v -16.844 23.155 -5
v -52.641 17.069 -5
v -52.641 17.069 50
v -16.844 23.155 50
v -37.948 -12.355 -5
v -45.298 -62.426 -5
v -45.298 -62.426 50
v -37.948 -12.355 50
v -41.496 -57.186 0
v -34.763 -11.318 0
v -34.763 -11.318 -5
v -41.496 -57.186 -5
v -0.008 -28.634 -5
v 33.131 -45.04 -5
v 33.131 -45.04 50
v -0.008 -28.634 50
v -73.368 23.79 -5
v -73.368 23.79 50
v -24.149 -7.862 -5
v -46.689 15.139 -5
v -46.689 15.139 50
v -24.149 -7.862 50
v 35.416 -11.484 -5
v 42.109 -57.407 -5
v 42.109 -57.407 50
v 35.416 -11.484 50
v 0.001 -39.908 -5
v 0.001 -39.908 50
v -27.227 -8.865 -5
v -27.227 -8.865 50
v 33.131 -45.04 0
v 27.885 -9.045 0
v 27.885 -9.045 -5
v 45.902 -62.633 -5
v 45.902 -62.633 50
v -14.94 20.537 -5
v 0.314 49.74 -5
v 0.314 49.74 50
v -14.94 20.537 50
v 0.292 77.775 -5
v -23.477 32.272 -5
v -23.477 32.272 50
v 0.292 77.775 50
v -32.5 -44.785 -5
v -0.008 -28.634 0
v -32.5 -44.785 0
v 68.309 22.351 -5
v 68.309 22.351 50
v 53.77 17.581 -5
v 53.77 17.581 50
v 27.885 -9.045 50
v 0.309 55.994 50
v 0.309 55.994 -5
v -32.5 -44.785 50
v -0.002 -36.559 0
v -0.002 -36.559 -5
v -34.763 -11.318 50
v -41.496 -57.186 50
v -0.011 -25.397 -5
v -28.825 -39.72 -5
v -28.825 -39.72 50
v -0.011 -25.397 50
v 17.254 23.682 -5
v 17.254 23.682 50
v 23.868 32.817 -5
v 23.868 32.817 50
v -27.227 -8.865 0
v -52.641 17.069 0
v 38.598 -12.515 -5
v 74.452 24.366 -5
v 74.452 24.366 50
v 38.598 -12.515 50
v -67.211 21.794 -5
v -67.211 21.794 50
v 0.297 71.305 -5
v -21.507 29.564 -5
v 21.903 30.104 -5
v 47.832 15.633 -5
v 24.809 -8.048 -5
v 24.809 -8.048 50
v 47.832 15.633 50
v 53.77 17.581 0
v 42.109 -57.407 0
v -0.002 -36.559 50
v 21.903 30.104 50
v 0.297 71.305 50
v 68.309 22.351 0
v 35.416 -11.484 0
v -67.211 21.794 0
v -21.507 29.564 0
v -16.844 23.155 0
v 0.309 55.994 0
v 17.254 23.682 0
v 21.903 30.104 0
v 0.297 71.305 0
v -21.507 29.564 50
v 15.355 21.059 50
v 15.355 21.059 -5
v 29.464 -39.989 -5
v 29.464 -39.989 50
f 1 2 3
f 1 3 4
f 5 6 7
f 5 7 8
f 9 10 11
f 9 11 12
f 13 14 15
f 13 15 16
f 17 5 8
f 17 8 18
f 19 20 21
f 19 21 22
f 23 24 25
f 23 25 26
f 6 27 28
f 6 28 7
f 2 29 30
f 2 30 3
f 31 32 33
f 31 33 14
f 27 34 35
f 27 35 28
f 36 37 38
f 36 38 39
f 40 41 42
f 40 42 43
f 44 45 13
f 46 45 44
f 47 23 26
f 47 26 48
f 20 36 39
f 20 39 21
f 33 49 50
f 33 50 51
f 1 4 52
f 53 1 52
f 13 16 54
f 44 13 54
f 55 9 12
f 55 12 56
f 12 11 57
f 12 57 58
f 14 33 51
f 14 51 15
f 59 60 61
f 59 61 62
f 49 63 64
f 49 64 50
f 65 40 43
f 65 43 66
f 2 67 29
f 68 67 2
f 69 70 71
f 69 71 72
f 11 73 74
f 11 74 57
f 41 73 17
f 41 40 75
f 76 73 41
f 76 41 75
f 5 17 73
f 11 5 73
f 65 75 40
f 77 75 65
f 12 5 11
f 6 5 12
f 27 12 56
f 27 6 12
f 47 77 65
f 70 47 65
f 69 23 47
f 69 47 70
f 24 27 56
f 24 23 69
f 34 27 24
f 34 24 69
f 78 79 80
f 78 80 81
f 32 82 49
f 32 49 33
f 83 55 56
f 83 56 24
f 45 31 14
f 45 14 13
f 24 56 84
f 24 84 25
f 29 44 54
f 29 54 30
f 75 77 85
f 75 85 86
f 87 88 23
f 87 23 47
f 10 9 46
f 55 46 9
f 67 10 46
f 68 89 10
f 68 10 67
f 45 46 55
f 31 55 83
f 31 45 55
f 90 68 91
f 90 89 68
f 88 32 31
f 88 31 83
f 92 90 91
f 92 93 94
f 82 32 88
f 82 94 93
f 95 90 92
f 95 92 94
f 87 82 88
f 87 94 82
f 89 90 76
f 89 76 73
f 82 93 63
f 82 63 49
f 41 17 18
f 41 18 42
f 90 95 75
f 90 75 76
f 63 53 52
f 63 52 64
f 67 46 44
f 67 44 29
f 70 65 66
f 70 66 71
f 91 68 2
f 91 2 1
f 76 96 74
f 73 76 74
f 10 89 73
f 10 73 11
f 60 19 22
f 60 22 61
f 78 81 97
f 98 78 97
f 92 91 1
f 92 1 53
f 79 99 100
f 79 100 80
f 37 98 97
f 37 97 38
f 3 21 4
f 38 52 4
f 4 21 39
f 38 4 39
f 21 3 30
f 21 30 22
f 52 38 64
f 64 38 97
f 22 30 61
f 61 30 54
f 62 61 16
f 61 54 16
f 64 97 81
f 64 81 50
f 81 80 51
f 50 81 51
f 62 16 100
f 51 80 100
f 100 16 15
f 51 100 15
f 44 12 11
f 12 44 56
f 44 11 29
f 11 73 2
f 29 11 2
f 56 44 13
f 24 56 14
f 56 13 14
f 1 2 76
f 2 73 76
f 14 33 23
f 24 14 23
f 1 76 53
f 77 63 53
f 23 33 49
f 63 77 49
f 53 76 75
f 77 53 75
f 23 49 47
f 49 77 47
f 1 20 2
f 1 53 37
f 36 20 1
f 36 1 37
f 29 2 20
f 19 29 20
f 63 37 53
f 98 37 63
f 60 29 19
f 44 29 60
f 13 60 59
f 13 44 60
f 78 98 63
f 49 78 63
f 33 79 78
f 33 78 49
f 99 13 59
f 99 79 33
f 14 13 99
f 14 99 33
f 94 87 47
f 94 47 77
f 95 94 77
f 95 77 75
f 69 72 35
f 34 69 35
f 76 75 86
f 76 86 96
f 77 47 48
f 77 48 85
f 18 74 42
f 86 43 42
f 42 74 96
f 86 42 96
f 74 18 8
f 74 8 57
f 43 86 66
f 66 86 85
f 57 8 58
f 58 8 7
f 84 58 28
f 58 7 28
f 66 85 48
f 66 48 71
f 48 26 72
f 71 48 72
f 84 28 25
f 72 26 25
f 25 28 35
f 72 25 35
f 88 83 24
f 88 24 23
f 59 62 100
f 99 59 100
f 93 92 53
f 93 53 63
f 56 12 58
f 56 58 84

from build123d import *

# Parameters (mm, degrees)
F1_DEPTH = 5
F3_DEPTH = 55


with BuildPart() as f1:
    # F0 (on Top) → F1 (new body)
    with BuildSketch(Plane.XY):
        Polygon((-34.763327, -11.318235), (-41.496448, -57.185943), (-0.0018, -36.559422), (42.108634, -57.407447), (35.415632, -11.484328), (68.309159, 22.35061), (21.903292, 30.103534), (0.296809, 71.305215), (-21.50674, 29.564362), (-67.211132, 21.793876), align=None)
        Polygon((-16.844336, 23.155162), (0.309144, 55.993896), (17.253802, 23.681909), (53.77023, 17.581192), (27.885076, -9.044794), (33.131209, -45.040425), (-0.008188, -28.633779), (-32.499982, -44.785083), (-27.227054, -8.864577), (-52.640564, 17.069225), align=None, mode=Mode.SUBTRACT)
    extrude(amount=-F1_DEPTH)


with BuildPart() as f3:
    # F2 (on face) → F3 (new body)
    with BuildSketch(Plane(origin=(0, 0, -5), x_dir=(1, 0, 0), z_dir=(0, 0, -1))):
        Polygon((23.867865, -32.816896), (74.452369, -24.365858), (38.597557, 12.515117), (45.901911, 62.632949), (0.0009, 39.908285), (-45.297772, 62.425743), (-37.947667, 12.354991), (-73.367711, -23.790208), (-23.476769, -32.272474), (0.291597, -77.774787), align=None)
        Polygon((-21.50674, -29.564362), (-67.211132, -21.793876), (-34.763327, 11.318235), (-41.496448, 57.185943), (-0.0018, 36.559422), (42.108634, 57.407447), (35.415632, 11.484328), (68.309159, -22.35061), (21.903292, -30.103534), (0.296809, -71.305215), align=None, mode=Mode.SUBTRACT)
        Polygon((-16.844336, -23.155162), (0.309144, -55.993896), (17.253802, -23.681909), (53.77023, -17.581192), (27.885076, 9.044794), (33.131209, 45.040425), (-0.008188, 28.633779), (-32.499982, 44.785083), (-27.227054, 8.864577), (-52.640564, -17.069225), align=None)
        Polygon((24.809214, 8.048364), (47.831793, -15.63312), (15.354714, -21.058992), (0.314183, -49.739976), (-14.939974, -20.53732), (-46.689205, -15.139438), (-24.148858, 7.862379), (-28.825369, 39.719942), (-0.010798, 25.396545), (29.464374, 39.989106), align=None, mode=Mode.SUBTRACT)
    extrude(amount=-F3_DEPTH)


solid = Compound([f1.part, f3.part])
